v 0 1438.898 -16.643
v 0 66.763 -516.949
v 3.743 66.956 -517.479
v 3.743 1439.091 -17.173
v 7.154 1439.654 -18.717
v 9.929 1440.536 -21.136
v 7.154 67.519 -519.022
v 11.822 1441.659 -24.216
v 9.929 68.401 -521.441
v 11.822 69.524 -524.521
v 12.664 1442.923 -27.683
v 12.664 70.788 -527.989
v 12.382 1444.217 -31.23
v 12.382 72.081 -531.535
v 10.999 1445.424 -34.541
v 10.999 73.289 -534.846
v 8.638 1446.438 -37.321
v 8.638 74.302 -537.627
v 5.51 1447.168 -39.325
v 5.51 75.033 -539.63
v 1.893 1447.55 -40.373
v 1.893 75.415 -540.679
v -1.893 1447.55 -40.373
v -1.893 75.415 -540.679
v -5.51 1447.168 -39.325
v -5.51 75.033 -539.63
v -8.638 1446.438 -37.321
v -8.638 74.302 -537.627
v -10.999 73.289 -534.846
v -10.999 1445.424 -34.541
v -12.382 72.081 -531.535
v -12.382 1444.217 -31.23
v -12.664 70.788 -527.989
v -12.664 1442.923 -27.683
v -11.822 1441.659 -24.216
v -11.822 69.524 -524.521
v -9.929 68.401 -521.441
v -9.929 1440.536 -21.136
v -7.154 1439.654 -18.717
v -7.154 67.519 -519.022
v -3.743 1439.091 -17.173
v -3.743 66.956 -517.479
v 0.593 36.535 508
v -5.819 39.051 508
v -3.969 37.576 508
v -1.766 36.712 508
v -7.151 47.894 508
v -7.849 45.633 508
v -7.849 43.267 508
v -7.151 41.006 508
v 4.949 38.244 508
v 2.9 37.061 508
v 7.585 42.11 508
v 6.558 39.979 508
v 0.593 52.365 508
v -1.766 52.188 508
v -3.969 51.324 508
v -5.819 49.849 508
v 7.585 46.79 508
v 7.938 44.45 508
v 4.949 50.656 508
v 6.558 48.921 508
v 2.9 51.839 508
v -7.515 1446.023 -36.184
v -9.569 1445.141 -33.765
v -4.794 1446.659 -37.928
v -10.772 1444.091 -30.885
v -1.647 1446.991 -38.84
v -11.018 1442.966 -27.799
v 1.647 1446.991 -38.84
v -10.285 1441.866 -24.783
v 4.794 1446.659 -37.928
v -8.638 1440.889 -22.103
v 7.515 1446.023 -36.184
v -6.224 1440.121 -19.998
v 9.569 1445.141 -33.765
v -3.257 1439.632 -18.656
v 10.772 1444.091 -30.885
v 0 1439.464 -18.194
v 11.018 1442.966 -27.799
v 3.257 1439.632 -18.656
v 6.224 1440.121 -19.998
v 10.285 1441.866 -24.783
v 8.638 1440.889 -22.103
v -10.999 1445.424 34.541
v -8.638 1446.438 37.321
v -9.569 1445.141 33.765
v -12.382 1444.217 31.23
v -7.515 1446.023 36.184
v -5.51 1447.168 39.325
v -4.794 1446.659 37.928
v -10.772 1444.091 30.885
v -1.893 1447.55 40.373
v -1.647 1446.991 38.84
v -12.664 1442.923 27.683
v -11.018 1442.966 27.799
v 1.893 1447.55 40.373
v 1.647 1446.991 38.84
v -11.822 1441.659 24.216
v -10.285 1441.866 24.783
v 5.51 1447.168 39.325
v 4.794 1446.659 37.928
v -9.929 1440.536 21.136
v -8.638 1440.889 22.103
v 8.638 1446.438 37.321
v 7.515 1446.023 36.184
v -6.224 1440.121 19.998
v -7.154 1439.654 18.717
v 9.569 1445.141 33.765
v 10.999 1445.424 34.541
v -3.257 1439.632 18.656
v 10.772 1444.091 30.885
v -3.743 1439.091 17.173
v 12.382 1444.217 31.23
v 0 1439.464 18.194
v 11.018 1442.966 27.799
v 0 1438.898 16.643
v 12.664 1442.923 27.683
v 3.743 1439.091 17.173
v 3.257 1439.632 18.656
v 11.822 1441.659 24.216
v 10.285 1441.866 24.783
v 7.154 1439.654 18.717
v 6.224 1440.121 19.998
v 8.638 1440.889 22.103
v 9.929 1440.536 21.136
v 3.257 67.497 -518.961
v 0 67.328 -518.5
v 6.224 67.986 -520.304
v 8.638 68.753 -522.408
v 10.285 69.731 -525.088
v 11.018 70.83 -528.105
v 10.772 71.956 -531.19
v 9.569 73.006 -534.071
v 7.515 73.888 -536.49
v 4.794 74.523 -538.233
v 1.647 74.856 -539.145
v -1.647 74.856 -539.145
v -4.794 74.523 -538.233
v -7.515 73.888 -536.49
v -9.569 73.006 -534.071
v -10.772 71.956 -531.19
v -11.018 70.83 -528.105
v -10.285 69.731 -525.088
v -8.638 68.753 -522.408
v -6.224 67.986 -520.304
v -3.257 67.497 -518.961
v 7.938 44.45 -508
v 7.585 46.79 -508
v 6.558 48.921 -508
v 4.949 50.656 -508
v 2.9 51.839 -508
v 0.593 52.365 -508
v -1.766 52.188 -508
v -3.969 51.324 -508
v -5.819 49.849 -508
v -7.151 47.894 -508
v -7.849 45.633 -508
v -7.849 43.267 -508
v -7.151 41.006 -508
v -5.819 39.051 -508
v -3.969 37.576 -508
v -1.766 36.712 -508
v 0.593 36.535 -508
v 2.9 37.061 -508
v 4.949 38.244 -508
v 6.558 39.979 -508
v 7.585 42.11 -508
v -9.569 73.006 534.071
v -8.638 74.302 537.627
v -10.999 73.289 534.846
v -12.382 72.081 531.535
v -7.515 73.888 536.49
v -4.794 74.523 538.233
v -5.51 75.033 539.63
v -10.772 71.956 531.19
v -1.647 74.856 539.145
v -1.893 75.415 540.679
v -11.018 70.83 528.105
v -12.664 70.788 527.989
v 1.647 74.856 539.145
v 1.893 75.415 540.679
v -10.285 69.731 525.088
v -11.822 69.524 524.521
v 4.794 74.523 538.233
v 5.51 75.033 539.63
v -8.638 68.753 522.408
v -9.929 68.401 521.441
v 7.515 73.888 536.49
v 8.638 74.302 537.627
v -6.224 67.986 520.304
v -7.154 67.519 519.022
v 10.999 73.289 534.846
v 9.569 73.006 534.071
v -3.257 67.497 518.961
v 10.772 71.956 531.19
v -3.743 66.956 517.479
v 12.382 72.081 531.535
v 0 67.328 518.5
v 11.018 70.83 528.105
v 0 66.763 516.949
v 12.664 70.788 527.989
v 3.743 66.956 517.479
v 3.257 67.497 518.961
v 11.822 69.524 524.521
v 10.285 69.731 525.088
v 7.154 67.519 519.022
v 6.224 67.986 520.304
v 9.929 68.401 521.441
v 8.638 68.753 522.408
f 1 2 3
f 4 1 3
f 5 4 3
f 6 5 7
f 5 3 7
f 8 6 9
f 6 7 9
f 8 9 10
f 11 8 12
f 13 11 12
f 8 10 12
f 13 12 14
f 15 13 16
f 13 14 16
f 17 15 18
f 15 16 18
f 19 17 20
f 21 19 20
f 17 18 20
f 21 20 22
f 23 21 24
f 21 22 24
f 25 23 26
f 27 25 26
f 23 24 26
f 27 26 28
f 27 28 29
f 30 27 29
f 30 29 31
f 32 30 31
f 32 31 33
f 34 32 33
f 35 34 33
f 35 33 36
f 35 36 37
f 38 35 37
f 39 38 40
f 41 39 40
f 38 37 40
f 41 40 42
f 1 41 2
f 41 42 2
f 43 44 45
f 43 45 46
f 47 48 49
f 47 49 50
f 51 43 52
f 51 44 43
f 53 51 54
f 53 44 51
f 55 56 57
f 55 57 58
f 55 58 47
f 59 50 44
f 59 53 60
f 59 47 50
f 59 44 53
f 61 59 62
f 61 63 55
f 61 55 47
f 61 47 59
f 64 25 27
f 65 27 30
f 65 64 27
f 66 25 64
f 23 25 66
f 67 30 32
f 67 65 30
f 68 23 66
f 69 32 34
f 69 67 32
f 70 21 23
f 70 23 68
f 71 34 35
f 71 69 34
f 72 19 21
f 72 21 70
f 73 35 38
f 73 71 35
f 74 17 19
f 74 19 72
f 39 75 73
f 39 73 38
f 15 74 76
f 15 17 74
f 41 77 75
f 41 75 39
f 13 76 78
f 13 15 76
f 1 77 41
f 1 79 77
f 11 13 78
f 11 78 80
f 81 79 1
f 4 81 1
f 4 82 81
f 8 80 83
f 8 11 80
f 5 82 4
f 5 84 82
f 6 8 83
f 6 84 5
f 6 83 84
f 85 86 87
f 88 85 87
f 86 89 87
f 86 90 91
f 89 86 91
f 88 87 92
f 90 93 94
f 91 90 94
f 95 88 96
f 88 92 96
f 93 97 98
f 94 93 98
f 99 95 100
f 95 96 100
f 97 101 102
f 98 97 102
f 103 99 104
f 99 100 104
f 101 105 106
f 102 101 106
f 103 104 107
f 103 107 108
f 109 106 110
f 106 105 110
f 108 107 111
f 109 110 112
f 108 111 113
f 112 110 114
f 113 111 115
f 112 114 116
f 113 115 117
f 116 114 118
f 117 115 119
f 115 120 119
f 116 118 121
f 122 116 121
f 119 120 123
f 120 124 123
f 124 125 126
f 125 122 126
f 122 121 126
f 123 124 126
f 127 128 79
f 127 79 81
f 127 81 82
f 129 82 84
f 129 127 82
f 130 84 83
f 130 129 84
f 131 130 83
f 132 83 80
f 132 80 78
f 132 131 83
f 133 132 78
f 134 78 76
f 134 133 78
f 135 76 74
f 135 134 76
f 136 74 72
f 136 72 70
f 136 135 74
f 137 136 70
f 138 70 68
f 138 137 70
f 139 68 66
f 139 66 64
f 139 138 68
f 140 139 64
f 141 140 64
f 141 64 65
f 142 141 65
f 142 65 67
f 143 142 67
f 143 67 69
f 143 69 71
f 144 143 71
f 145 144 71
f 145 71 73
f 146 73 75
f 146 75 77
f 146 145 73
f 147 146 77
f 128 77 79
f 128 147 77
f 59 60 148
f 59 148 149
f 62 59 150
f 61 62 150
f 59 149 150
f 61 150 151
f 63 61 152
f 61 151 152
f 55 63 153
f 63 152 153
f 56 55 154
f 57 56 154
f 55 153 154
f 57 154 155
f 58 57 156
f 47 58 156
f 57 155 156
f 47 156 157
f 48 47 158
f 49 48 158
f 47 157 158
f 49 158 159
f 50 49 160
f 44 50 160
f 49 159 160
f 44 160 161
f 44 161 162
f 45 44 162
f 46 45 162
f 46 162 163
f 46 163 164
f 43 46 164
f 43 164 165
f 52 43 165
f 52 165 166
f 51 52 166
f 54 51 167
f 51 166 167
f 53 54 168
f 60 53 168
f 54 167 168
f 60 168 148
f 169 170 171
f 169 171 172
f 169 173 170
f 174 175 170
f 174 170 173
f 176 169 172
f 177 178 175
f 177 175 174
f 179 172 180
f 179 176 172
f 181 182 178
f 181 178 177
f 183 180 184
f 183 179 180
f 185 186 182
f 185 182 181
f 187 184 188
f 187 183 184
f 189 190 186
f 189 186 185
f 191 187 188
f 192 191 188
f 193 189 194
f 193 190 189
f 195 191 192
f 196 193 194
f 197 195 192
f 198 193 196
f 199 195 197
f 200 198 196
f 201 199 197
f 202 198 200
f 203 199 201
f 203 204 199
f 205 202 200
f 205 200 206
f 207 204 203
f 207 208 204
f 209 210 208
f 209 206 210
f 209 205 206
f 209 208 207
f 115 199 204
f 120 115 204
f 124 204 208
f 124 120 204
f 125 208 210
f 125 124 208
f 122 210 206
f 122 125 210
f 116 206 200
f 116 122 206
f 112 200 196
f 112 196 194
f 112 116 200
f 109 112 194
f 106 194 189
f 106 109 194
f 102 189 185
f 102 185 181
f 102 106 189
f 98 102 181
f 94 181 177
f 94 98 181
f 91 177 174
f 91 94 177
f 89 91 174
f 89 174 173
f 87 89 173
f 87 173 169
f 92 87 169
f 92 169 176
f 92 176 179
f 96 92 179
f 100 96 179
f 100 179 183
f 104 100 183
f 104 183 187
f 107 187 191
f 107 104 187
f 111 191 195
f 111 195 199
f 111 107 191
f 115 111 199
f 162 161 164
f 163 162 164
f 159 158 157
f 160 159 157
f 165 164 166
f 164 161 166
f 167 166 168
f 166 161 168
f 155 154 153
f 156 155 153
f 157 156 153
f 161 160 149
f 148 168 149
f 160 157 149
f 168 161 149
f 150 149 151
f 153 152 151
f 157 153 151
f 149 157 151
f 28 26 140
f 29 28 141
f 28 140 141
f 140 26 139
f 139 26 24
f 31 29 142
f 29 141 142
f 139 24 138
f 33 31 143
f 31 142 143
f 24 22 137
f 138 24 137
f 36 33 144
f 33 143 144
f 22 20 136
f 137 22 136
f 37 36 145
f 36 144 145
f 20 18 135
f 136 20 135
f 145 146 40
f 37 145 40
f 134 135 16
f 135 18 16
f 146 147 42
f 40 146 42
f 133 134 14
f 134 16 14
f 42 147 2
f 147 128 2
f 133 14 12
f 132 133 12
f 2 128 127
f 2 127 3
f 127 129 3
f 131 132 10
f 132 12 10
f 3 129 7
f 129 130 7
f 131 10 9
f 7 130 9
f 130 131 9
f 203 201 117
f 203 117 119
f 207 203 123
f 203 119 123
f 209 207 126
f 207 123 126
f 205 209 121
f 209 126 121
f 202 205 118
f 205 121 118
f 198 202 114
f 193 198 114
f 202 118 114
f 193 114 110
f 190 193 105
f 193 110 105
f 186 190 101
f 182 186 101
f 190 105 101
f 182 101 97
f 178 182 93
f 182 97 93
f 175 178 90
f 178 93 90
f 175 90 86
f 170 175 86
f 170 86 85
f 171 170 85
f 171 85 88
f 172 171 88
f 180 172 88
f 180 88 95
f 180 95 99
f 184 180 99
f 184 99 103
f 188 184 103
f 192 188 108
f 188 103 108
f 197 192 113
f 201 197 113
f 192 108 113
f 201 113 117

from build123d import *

# Parameters (mm, degrees)
BOSS_EXTRUDE3_DEPTH      = 730.25
BOSS_EXTRUDE3_DEPTH_BACK = 730.25
SKETCH6_R                = 12.7
SKETCH6_R_2              = 11.049
BOSS_EXTRUDE4_DEPTH      = 730.25
BOSS_EXTRUDE4_DEPTH_BACK = 730.25
SKETCH7_R                = 12.7
SKETCH7_R_2              = 11.049
BOSS_EXTRUDE6_DEPTH      = 508
BOSS_EXTRUDE6_DEPTH_BACK = 508
SKETCH10_R               = 7.9375


with BuildPart() as part:
    # Sketch6 → Boss-Extrude3 (new, two sides: drawn at the far end of the back side and taken through both)
    with BuildSketch(Plane(origin=(0, 757.180911244, -278.727658666), x_dir=(1, 0, 0), z_dir=(0, 0.9394968428050069, 0.34255756065138043)).offset(-BOSS_EXTRUDE3_DEPTH_BACK)):
        with Locations(Location((0, 0, 0), (0, 0, 270))):
            Circle(SKETCH6_R)
        with Locations(Location((0, 0, 0), (0, 0, 270))):
            Circle(SKETCH6_R_2, mode=Mode.SUBTRACT)
    extrude(amount=BOSS_EXTRUDE3_DEPTH + BOSS_EXTRUDE3_DEPTH_BACK)


with BuildPart() as body_2:
    # Sketch7 → Boss-Extrude4 (new, two sides: drawn at the far end of the back side and taken through both)
    with BuildSketch(Plane(origin=(0, 757.180911244, 278.727658666), x_dir=(-1, 0, 0), z_dir=(0, -0.939496842805007, 0.34255756065138043)).offset(-BOSS_EXTRUDE4_DEPTH_BACK)):
        with Locations(Location((0, 0, 0), (0, 0, 90))):
            Circle(SKETCH7_R)
        with Locations(Location((0, 0, 0), (0, 0, 90))):
            Circle(SKETCH7_R_2, mode=Mode.SUBTRACT)
    extrude(amount=BOSS_EXTRUDE4_DEPTH + BOSS_EXTRUDE4_DEPTH_BACK)


with BuildPart() as body_3:
    # Sketch10 → Boss-Extrude6 (new, two sides: drawn at the far end of the back side and taken through both)
    with BuildSketch(Plane.XY.offset(-BOSS_EXTRUDE6_DEPTH_BACK)):
        with Locations((0, 44.45)):
            Circle(SKETCH10_R)
    extrude(amount=BOSS_EXTRUDE6_DEPTH + BOSS_EXTRUDE6_DEPTH_BACK)


solid = Compound([part.part, body_2.part, body_3.part])
